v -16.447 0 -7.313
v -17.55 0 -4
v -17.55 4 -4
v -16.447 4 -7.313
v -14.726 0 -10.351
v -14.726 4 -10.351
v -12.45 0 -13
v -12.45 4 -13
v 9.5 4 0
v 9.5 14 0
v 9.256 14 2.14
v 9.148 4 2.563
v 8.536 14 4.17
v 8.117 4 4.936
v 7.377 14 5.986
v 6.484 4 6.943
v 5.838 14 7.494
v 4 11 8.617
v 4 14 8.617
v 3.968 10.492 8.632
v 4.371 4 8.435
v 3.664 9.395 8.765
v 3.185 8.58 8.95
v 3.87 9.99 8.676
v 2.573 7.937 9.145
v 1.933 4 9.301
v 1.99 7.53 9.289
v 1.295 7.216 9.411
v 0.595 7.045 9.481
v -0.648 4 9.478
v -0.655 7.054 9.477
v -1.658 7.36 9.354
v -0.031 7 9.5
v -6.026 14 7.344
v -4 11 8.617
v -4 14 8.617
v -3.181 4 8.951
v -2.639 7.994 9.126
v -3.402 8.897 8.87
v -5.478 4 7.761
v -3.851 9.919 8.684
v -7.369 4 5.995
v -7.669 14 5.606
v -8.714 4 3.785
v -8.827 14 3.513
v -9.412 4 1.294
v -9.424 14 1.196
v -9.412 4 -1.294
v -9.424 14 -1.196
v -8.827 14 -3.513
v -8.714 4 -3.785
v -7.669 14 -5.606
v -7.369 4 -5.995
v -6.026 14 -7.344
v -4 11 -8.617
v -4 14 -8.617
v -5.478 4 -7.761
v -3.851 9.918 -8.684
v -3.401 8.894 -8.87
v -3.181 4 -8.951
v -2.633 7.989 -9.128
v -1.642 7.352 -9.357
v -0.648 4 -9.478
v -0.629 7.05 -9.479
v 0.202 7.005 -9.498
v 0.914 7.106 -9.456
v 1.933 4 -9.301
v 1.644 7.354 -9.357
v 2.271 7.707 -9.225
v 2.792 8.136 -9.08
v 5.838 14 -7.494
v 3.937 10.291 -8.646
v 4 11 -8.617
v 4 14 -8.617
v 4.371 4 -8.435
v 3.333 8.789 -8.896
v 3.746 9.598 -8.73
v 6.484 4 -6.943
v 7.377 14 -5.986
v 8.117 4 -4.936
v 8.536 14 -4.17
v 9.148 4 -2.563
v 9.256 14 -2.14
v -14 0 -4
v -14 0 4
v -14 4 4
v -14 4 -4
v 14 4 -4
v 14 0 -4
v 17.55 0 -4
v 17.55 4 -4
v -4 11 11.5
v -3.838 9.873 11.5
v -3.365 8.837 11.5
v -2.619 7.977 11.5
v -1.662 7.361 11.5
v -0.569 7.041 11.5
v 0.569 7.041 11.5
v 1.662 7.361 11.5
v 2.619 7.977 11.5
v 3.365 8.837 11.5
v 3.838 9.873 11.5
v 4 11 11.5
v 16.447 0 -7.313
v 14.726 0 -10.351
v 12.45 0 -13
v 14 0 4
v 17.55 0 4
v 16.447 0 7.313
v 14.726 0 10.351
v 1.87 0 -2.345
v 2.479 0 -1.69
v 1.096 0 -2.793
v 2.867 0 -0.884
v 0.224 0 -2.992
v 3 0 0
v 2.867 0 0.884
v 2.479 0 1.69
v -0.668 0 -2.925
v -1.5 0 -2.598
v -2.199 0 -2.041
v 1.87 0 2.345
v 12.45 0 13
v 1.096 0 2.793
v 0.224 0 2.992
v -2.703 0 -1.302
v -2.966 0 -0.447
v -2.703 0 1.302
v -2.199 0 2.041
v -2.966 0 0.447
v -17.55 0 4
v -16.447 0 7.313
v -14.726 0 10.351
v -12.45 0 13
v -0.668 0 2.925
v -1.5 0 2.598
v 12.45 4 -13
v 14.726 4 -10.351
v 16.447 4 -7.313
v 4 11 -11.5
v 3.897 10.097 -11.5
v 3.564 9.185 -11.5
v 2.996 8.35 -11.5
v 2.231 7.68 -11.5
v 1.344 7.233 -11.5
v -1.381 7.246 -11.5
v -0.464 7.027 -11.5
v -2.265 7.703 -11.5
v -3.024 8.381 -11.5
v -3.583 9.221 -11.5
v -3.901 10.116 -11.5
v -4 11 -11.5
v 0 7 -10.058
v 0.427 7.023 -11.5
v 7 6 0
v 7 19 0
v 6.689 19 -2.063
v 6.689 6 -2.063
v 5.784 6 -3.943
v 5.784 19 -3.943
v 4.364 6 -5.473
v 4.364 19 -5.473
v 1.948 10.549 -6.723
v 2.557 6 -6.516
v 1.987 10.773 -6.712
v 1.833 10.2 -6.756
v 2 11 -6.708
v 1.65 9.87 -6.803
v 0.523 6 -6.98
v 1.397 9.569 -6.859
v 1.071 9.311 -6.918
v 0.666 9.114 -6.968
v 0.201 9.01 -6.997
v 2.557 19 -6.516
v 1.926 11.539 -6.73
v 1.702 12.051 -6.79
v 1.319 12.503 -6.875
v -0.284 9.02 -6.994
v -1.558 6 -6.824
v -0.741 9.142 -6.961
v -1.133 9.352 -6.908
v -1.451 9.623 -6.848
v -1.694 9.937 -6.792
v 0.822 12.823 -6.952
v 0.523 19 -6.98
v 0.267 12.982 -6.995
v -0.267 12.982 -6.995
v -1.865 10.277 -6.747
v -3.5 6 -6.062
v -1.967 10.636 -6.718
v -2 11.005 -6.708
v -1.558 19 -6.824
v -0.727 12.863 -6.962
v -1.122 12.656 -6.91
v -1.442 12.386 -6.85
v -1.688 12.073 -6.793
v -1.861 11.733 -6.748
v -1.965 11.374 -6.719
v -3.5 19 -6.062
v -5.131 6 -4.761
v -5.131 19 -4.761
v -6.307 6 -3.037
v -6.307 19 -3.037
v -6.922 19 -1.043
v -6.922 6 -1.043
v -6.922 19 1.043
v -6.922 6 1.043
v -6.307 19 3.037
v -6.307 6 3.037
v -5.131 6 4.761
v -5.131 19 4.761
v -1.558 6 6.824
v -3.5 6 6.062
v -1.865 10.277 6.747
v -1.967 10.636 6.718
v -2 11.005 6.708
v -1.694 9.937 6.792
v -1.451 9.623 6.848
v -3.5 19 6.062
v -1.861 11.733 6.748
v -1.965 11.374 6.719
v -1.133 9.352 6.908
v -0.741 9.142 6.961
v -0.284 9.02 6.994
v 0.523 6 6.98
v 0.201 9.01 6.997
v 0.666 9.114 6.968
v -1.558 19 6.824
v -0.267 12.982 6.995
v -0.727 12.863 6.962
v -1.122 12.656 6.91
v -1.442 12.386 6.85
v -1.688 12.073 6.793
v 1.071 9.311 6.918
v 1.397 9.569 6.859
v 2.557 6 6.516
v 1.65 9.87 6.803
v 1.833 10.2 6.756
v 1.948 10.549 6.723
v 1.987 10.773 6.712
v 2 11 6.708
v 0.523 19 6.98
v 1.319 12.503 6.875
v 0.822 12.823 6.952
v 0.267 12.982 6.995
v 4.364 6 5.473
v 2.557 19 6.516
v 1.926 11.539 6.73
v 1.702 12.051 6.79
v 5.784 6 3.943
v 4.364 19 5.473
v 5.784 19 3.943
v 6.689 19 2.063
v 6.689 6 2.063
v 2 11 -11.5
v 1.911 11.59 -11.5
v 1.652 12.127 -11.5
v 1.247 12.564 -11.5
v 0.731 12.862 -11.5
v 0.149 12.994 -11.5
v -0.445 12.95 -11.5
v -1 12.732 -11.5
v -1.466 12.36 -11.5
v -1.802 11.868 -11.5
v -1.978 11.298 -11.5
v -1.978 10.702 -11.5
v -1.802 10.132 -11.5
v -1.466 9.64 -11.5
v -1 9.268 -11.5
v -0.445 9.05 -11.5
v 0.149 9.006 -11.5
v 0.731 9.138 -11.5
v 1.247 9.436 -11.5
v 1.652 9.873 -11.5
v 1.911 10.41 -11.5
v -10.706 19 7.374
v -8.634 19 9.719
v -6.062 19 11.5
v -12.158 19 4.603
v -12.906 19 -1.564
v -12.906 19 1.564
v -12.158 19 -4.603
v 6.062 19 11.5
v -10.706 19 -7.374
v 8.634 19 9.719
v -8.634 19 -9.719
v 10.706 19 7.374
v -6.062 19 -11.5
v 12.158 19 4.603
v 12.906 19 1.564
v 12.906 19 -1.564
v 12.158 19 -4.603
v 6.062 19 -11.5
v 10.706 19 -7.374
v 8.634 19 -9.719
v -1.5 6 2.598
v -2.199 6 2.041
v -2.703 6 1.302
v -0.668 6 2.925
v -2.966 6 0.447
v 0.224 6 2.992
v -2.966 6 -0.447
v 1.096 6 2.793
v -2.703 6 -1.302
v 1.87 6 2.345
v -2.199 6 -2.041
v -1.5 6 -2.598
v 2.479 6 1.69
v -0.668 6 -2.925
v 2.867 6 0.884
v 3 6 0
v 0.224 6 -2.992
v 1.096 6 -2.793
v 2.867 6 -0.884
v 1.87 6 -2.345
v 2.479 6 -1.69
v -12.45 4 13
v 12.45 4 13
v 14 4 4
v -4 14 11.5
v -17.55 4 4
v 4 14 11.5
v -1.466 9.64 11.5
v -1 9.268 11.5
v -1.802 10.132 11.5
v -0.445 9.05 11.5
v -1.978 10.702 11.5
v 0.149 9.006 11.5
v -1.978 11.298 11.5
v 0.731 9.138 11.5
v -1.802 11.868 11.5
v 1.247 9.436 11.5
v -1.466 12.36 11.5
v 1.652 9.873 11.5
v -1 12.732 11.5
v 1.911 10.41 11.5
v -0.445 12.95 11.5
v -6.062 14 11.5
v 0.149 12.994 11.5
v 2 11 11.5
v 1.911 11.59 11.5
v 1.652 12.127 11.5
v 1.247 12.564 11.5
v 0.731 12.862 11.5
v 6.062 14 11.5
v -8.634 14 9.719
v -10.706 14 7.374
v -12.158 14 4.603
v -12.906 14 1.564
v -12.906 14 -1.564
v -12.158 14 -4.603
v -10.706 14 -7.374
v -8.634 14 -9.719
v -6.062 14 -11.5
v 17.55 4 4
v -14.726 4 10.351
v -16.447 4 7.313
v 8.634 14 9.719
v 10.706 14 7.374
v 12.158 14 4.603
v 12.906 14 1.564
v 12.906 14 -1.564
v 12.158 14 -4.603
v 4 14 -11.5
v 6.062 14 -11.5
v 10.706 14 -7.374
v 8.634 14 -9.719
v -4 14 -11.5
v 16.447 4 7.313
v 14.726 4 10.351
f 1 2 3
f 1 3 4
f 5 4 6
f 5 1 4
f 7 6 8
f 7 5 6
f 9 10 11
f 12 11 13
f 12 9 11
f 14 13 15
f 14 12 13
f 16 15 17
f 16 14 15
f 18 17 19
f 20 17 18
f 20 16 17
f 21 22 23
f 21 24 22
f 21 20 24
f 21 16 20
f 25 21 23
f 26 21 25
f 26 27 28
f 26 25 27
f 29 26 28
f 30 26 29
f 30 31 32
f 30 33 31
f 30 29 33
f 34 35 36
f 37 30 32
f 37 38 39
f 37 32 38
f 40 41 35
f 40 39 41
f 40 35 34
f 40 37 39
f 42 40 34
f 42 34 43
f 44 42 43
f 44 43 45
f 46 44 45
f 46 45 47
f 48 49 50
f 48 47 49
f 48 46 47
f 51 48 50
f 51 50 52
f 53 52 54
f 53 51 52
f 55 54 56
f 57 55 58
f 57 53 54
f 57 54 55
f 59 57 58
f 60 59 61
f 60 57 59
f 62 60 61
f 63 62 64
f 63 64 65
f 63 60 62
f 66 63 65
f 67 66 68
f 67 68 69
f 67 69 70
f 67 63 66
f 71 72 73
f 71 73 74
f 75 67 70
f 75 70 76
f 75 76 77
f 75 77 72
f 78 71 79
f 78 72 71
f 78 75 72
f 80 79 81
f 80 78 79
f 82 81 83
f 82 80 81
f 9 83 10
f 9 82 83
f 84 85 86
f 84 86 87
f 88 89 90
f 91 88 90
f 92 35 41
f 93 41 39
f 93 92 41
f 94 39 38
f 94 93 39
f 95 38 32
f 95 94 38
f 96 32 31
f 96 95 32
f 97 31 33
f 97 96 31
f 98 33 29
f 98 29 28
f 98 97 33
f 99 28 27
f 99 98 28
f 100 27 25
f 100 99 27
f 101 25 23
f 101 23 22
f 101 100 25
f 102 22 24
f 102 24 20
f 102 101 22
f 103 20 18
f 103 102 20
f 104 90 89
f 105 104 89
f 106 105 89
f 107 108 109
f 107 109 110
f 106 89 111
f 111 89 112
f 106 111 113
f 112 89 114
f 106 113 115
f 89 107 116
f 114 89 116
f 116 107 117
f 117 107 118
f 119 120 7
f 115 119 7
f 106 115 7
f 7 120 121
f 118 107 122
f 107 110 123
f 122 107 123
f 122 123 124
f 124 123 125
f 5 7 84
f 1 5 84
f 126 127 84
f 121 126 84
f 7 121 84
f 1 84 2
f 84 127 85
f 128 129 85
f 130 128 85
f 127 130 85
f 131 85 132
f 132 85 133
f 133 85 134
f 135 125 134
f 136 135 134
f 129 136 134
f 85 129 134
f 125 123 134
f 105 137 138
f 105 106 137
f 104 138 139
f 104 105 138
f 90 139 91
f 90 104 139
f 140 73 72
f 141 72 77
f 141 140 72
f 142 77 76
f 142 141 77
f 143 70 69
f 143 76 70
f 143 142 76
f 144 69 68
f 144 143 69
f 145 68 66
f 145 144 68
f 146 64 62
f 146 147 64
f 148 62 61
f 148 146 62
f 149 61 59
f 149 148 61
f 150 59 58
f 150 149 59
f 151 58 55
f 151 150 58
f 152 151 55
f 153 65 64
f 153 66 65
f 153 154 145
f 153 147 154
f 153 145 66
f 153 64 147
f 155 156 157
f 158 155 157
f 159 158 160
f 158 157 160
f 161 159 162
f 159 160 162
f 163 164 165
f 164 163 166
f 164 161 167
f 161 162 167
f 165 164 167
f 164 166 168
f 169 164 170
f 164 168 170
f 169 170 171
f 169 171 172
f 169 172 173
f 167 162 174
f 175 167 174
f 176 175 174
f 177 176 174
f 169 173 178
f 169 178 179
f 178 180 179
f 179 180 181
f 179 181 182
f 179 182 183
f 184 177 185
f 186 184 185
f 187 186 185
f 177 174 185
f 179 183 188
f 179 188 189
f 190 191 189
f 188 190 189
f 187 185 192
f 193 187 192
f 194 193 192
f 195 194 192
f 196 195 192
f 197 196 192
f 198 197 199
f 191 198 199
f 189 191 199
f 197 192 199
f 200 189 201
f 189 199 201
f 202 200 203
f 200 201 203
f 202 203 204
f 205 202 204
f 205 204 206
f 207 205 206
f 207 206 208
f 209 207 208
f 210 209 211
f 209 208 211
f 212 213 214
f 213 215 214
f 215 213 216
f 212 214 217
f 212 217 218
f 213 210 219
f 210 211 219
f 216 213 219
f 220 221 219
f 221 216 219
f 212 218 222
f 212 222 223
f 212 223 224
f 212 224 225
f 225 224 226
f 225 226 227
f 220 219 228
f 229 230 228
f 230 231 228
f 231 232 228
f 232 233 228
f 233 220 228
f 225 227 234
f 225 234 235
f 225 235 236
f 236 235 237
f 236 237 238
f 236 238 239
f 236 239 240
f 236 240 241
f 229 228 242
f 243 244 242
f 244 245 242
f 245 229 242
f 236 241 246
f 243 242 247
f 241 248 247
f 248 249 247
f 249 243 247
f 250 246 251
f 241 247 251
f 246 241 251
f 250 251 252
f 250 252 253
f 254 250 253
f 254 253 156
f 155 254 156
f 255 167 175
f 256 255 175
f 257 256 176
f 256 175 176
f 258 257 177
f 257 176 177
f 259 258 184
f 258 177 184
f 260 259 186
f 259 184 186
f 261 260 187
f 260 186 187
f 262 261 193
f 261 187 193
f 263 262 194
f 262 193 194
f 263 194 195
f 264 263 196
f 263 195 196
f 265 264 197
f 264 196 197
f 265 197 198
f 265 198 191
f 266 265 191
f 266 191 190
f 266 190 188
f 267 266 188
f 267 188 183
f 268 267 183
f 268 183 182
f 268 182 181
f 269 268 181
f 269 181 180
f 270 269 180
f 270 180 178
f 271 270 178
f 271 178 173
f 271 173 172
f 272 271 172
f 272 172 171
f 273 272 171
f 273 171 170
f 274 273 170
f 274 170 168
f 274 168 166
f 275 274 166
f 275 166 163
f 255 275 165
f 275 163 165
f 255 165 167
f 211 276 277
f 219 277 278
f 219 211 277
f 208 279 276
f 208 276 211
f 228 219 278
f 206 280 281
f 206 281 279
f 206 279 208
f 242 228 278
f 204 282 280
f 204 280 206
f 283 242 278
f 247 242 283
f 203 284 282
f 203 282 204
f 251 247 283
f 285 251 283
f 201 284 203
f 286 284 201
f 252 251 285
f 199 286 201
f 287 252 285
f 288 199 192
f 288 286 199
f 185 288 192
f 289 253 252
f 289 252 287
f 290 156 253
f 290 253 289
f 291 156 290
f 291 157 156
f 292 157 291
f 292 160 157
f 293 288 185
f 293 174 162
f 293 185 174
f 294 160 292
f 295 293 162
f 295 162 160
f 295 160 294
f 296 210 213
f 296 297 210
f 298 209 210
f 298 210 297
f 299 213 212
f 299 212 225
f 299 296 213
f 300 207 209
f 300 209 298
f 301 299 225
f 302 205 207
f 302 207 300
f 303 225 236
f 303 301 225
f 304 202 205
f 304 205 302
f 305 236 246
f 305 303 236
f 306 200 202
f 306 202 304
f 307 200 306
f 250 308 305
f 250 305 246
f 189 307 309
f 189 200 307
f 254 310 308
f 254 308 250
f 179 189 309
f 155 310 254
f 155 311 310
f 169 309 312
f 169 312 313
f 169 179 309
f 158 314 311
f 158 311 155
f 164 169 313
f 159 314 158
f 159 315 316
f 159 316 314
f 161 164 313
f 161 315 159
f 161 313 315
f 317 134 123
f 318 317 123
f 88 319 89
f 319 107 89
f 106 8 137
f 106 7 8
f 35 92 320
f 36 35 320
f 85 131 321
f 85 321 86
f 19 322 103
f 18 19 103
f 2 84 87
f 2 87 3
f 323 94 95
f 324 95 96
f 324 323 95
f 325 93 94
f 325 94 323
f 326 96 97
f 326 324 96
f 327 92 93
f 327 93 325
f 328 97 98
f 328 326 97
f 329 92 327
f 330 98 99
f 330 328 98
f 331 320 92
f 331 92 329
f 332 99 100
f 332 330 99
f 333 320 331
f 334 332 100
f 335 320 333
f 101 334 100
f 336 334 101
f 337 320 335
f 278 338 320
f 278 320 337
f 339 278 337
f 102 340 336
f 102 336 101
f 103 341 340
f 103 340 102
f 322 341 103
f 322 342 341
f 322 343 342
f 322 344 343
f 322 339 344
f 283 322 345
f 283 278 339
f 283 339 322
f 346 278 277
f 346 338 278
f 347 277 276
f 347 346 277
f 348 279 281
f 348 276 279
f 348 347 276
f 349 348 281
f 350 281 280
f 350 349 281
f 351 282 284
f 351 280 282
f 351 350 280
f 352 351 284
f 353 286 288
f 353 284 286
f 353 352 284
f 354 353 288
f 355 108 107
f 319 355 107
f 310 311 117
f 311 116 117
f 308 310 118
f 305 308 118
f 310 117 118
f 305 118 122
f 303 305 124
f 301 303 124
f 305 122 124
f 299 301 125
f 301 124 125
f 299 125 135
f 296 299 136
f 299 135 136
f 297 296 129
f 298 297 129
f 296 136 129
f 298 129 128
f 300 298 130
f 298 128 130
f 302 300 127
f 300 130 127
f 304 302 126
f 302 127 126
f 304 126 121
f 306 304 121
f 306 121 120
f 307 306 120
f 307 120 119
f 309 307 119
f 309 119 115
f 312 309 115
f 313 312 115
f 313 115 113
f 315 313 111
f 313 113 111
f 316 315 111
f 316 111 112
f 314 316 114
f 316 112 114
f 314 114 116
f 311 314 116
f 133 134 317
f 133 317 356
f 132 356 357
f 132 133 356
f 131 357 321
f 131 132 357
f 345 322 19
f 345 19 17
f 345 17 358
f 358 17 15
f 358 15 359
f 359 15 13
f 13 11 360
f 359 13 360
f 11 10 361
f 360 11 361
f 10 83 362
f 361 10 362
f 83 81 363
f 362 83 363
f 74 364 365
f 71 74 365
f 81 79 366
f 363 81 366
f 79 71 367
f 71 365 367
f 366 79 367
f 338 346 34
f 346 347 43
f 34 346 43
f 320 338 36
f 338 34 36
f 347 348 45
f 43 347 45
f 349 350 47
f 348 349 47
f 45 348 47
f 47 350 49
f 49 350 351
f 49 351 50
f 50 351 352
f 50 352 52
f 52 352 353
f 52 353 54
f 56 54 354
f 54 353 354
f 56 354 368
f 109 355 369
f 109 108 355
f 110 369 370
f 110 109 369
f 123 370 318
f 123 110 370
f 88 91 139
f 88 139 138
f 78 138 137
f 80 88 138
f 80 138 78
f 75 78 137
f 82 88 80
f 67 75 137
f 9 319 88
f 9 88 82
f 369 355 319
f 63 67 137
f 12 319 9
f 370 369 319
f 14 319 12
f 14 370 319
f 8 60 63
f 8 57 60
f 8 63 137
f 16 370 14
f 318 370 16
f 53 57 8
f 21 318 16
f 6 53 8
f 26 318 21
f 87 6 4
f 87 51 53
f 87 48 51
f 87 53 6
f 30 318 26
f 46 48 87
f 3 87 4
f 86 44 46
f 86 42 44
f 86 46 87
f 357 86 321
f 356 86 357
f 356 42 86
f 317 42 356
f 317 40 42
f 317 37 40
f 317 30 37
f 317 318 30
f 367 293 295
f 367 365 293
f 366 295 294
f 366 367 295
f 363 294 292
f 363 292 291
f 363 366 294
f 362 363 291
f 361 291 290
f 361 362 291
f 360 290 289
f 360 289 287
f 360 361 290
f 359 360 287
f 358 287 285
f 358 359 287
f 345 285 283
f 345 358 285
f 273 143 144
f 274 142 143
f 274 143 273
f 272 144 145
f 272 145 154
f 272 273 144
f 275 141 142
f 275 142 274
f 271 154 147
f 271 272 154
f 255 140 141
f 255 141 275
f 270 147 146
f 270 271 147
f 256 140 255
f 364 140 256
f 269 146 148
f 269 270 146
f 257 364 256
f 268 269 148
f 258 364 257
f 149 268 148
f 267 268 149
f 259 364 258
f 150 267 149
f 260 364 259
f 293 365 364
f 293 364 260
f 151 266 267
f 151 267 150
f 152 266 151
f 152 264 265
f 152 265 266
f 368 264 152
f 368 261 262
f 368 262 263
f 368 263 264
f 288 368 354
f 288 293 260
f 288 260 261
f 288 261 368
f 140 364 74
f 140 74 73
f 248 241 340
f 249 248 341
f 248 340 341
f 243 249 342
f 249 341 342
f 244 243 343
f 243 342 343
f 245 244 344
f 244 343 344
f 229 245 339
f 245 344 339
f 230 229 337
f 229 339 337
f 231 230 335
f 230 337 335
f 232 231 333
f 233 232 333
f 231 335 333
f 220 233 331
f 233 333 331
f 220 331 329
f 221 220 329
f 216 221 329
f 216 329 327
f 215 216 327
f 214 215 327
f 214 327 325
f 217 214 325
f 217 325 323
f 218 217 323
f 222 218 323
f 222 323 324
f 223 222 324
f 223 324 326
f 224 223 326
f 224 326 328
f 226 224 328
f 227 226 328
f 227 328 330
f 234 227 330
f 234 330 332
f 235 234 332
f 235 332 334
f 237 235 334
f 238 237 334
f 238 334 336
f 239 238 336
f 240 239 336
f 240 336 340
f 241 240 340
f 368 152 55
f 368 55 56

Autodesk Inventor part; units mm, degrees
ref_plane "YZ Plane" through (0, 0, 0) normal (1, 0, 0) x (0, 1, 0)
ref_plane "XZ Plane" through (0, 0, 0) normal (0, 1, 0) x (-1, 0, 0)
ref_plane "XY Plane" through (0, 0, 0) normal (0, 0, 1) x (1, 0, 0)
sketch "草图1" plane through (0, 0, 0) normal (0, 1, 0) x (-1, 0, 0)
  line L0 (12.4499, -13) -> (-12.4499, -13)
  line L1 (12.4499, 13) -> (-12.4499, 13)
  line L2 (21.8859, 0) -> (-29.1909, 0)
  line L3 (17.5499, 4) -> (14, 4)
  line L4 (14, 4) -> (14, -4)
  line L5 (14, -4) -> (17.5499, -4)
  line L6 (22, 4) -> (14, -4) construction
  line L7 (14, 4) -> (22, -4) construction
  line L8 (-17.5499, 4) -> (-14, 4)
  line L9 (-14, 4) -> (-14, -4)
  line L10 (-14, -4) -> (-17.5499, -4)
  line L11 (-22, 4) -> (-14, -4) construction
  line L12 (-14, 4) -> (-22, -4) construction
  arc A0 (12.4499, -13) -> (17.5499, -4) centre (0, 0) ccw
  arc A1 (17.5499, 4) -> (12.4499, 13) centre (0, 0) ccw
  arc A2 (-12.4499, 13) -> (-17.5499, 4) centre (0, 0) ccw
  arc A3 (-17.5499, -4) -> (-12.4499, -13) centre (0, 0) ccw
  point P0 (18, 0)
  point P1 (-18, 0)
  dimension "d1" = 26
  dimension "d2" = 8
  dimension "d3" = 8
  dimension "d4" = 8
  dimension "d5" = 8
extrude "拉伸1" add sketch "草图1" along normal blind 4
sketch "草图2" plane through (0, 4, 0) normal (0, 1, 0) x (1, 0, 0)
  arc A0 (17.5499, 4) -> (12.4499, 13) centre (0, 0) ccw projected
  circle A1 centre (0, 0) radius 9.5
  dimension "d8" = 19
extrude "拉伸2" add sketch "草图2" along normal blind 10
sketch "草图3" plane through (0, 14, 0) normal (0, 1, 0) x (1, 0, 0)
  circle A0 centre (0, 0) radius 9.5 projected
  circle A1 centre (0, 0) radius 13
  dimension "d11" = 26
extrude "拉伸3" add sketch "草图3" along normal blind 5 contours A0 | A1
sketch "草图4" plane through (0, 19, 0) normal (0, 1, 0) x (1, 0, 0)
  circle A0 centre (0, 0) radius 13 projected
  line L0 (-22.4415, 0) -> (25.3714, 0)
  line L1 (-6.0622, 11.5) -> (6.0622, 11.5)
  line L2 (-6.0622, -11.5) -> (6.0622, -11.5)
  dimension "d14" = 23
extrude "拉伸4" cut sketch "草图4" against normal blind 5 contours L1 A0 | A0 L2
sketch "草图5" plane through (-6.0622, 19, 11.5) normal (0, 0, 1) x (1, 0, 0)
  line L0 (0, 0) -> (12.1244, 0) projected
  line L1 (15.5622, -5) -> (-3.4378, -5) projected
  line L2 (-3.4378, -15) -> (15.5622, -15) projected
  line L3 (6.0622, -19) -> (6.0622, 3.3866)
  line L4 (2.0622, -8) -> (2.0622, -5)
  line L5 (2.0622, -5) -> (10.0622, -5)
  line L6 (10.0622, -5) -> (10.0622, -8)
  line L7 (10.0622, -8) -> (2.0622, -5) construction
  line L8 (2.0622, -8) -> (10.0622, -5) construction
  arc A0 (2.0622, -8) -> (10.0622, -8) centre (6.0622, -8) ccw
  point P0 (6.0622, -6.5)
  dimension "d17" = 8
  dimension "d18" = 3
extrude "拉伸5" add sketch "草图5" against normal blind 5
sketch "草图6" plane through (6.0622, 19, -11.5) normal (0, 0, -1) x (-1, 0, 0)
  line L0 (10.0622, -8) -> (10.0622, -5) projected
  line L1 (2.0622, -5) -> (10.0622, -5) projected
  line L2 (2.0622, -5) -> (2.0622, -8) projected
  line L3 (-3.4378, -15) -> (15.5622, -15) projected
  spline S0 degree 2 poles (2.0622, -8) (2.0622, -12) (6.0622, -12) (10.0622, -12) (10.0622, -8) knots 0 0 0 0.5 0.5 1 1 1 weights 1 0.707107 1 0.707107 1 projected
  point P0 (6.0622, -19)
extrude "拉伸6" add sketch "草图6" against normal blind 5
sketch "草图7" plane through (-6.0622, 19, 11.5) normal (0, 0, 1) x (1, 0, 0)
  arc A0 (2.0622, -8) -> (10.0622, -8) centre (6.0622, -8) ccw projected
  circle A1 centre (6.0622, -8) radius 2
  point P0 (6.0622, -19)
  dimension "d23" = 4
extrude "拉伸7" cut sketch "草图7" against normal blind 30
sketch "草图8" plane through (0, 19, 0) normal (0, 1, 0) x (1, 0, 0)
  arc A0 (6.0622, -11.5) -> (6.0622, 11.5) centre (0, 0) ccw projected
  circle A1 centre (0, 0) radius 7
  dimension "d26" = 14
extrude "拉伸8" cut sketch "草图8" against normal blind 13
sketch "草图9" plane through (0, 0, 0) normal (0, -1, 0) x (1, 0, 0)
  arc A0 (-17.5499, -4) -> (-12.4499, -13) centre (0, 0) ccw projected
  circle A1 centre (0, 0) radius 3
  dimension "d29" = 6
extrude "拉伸9" cut sketch "草图9" against normal blind 13
